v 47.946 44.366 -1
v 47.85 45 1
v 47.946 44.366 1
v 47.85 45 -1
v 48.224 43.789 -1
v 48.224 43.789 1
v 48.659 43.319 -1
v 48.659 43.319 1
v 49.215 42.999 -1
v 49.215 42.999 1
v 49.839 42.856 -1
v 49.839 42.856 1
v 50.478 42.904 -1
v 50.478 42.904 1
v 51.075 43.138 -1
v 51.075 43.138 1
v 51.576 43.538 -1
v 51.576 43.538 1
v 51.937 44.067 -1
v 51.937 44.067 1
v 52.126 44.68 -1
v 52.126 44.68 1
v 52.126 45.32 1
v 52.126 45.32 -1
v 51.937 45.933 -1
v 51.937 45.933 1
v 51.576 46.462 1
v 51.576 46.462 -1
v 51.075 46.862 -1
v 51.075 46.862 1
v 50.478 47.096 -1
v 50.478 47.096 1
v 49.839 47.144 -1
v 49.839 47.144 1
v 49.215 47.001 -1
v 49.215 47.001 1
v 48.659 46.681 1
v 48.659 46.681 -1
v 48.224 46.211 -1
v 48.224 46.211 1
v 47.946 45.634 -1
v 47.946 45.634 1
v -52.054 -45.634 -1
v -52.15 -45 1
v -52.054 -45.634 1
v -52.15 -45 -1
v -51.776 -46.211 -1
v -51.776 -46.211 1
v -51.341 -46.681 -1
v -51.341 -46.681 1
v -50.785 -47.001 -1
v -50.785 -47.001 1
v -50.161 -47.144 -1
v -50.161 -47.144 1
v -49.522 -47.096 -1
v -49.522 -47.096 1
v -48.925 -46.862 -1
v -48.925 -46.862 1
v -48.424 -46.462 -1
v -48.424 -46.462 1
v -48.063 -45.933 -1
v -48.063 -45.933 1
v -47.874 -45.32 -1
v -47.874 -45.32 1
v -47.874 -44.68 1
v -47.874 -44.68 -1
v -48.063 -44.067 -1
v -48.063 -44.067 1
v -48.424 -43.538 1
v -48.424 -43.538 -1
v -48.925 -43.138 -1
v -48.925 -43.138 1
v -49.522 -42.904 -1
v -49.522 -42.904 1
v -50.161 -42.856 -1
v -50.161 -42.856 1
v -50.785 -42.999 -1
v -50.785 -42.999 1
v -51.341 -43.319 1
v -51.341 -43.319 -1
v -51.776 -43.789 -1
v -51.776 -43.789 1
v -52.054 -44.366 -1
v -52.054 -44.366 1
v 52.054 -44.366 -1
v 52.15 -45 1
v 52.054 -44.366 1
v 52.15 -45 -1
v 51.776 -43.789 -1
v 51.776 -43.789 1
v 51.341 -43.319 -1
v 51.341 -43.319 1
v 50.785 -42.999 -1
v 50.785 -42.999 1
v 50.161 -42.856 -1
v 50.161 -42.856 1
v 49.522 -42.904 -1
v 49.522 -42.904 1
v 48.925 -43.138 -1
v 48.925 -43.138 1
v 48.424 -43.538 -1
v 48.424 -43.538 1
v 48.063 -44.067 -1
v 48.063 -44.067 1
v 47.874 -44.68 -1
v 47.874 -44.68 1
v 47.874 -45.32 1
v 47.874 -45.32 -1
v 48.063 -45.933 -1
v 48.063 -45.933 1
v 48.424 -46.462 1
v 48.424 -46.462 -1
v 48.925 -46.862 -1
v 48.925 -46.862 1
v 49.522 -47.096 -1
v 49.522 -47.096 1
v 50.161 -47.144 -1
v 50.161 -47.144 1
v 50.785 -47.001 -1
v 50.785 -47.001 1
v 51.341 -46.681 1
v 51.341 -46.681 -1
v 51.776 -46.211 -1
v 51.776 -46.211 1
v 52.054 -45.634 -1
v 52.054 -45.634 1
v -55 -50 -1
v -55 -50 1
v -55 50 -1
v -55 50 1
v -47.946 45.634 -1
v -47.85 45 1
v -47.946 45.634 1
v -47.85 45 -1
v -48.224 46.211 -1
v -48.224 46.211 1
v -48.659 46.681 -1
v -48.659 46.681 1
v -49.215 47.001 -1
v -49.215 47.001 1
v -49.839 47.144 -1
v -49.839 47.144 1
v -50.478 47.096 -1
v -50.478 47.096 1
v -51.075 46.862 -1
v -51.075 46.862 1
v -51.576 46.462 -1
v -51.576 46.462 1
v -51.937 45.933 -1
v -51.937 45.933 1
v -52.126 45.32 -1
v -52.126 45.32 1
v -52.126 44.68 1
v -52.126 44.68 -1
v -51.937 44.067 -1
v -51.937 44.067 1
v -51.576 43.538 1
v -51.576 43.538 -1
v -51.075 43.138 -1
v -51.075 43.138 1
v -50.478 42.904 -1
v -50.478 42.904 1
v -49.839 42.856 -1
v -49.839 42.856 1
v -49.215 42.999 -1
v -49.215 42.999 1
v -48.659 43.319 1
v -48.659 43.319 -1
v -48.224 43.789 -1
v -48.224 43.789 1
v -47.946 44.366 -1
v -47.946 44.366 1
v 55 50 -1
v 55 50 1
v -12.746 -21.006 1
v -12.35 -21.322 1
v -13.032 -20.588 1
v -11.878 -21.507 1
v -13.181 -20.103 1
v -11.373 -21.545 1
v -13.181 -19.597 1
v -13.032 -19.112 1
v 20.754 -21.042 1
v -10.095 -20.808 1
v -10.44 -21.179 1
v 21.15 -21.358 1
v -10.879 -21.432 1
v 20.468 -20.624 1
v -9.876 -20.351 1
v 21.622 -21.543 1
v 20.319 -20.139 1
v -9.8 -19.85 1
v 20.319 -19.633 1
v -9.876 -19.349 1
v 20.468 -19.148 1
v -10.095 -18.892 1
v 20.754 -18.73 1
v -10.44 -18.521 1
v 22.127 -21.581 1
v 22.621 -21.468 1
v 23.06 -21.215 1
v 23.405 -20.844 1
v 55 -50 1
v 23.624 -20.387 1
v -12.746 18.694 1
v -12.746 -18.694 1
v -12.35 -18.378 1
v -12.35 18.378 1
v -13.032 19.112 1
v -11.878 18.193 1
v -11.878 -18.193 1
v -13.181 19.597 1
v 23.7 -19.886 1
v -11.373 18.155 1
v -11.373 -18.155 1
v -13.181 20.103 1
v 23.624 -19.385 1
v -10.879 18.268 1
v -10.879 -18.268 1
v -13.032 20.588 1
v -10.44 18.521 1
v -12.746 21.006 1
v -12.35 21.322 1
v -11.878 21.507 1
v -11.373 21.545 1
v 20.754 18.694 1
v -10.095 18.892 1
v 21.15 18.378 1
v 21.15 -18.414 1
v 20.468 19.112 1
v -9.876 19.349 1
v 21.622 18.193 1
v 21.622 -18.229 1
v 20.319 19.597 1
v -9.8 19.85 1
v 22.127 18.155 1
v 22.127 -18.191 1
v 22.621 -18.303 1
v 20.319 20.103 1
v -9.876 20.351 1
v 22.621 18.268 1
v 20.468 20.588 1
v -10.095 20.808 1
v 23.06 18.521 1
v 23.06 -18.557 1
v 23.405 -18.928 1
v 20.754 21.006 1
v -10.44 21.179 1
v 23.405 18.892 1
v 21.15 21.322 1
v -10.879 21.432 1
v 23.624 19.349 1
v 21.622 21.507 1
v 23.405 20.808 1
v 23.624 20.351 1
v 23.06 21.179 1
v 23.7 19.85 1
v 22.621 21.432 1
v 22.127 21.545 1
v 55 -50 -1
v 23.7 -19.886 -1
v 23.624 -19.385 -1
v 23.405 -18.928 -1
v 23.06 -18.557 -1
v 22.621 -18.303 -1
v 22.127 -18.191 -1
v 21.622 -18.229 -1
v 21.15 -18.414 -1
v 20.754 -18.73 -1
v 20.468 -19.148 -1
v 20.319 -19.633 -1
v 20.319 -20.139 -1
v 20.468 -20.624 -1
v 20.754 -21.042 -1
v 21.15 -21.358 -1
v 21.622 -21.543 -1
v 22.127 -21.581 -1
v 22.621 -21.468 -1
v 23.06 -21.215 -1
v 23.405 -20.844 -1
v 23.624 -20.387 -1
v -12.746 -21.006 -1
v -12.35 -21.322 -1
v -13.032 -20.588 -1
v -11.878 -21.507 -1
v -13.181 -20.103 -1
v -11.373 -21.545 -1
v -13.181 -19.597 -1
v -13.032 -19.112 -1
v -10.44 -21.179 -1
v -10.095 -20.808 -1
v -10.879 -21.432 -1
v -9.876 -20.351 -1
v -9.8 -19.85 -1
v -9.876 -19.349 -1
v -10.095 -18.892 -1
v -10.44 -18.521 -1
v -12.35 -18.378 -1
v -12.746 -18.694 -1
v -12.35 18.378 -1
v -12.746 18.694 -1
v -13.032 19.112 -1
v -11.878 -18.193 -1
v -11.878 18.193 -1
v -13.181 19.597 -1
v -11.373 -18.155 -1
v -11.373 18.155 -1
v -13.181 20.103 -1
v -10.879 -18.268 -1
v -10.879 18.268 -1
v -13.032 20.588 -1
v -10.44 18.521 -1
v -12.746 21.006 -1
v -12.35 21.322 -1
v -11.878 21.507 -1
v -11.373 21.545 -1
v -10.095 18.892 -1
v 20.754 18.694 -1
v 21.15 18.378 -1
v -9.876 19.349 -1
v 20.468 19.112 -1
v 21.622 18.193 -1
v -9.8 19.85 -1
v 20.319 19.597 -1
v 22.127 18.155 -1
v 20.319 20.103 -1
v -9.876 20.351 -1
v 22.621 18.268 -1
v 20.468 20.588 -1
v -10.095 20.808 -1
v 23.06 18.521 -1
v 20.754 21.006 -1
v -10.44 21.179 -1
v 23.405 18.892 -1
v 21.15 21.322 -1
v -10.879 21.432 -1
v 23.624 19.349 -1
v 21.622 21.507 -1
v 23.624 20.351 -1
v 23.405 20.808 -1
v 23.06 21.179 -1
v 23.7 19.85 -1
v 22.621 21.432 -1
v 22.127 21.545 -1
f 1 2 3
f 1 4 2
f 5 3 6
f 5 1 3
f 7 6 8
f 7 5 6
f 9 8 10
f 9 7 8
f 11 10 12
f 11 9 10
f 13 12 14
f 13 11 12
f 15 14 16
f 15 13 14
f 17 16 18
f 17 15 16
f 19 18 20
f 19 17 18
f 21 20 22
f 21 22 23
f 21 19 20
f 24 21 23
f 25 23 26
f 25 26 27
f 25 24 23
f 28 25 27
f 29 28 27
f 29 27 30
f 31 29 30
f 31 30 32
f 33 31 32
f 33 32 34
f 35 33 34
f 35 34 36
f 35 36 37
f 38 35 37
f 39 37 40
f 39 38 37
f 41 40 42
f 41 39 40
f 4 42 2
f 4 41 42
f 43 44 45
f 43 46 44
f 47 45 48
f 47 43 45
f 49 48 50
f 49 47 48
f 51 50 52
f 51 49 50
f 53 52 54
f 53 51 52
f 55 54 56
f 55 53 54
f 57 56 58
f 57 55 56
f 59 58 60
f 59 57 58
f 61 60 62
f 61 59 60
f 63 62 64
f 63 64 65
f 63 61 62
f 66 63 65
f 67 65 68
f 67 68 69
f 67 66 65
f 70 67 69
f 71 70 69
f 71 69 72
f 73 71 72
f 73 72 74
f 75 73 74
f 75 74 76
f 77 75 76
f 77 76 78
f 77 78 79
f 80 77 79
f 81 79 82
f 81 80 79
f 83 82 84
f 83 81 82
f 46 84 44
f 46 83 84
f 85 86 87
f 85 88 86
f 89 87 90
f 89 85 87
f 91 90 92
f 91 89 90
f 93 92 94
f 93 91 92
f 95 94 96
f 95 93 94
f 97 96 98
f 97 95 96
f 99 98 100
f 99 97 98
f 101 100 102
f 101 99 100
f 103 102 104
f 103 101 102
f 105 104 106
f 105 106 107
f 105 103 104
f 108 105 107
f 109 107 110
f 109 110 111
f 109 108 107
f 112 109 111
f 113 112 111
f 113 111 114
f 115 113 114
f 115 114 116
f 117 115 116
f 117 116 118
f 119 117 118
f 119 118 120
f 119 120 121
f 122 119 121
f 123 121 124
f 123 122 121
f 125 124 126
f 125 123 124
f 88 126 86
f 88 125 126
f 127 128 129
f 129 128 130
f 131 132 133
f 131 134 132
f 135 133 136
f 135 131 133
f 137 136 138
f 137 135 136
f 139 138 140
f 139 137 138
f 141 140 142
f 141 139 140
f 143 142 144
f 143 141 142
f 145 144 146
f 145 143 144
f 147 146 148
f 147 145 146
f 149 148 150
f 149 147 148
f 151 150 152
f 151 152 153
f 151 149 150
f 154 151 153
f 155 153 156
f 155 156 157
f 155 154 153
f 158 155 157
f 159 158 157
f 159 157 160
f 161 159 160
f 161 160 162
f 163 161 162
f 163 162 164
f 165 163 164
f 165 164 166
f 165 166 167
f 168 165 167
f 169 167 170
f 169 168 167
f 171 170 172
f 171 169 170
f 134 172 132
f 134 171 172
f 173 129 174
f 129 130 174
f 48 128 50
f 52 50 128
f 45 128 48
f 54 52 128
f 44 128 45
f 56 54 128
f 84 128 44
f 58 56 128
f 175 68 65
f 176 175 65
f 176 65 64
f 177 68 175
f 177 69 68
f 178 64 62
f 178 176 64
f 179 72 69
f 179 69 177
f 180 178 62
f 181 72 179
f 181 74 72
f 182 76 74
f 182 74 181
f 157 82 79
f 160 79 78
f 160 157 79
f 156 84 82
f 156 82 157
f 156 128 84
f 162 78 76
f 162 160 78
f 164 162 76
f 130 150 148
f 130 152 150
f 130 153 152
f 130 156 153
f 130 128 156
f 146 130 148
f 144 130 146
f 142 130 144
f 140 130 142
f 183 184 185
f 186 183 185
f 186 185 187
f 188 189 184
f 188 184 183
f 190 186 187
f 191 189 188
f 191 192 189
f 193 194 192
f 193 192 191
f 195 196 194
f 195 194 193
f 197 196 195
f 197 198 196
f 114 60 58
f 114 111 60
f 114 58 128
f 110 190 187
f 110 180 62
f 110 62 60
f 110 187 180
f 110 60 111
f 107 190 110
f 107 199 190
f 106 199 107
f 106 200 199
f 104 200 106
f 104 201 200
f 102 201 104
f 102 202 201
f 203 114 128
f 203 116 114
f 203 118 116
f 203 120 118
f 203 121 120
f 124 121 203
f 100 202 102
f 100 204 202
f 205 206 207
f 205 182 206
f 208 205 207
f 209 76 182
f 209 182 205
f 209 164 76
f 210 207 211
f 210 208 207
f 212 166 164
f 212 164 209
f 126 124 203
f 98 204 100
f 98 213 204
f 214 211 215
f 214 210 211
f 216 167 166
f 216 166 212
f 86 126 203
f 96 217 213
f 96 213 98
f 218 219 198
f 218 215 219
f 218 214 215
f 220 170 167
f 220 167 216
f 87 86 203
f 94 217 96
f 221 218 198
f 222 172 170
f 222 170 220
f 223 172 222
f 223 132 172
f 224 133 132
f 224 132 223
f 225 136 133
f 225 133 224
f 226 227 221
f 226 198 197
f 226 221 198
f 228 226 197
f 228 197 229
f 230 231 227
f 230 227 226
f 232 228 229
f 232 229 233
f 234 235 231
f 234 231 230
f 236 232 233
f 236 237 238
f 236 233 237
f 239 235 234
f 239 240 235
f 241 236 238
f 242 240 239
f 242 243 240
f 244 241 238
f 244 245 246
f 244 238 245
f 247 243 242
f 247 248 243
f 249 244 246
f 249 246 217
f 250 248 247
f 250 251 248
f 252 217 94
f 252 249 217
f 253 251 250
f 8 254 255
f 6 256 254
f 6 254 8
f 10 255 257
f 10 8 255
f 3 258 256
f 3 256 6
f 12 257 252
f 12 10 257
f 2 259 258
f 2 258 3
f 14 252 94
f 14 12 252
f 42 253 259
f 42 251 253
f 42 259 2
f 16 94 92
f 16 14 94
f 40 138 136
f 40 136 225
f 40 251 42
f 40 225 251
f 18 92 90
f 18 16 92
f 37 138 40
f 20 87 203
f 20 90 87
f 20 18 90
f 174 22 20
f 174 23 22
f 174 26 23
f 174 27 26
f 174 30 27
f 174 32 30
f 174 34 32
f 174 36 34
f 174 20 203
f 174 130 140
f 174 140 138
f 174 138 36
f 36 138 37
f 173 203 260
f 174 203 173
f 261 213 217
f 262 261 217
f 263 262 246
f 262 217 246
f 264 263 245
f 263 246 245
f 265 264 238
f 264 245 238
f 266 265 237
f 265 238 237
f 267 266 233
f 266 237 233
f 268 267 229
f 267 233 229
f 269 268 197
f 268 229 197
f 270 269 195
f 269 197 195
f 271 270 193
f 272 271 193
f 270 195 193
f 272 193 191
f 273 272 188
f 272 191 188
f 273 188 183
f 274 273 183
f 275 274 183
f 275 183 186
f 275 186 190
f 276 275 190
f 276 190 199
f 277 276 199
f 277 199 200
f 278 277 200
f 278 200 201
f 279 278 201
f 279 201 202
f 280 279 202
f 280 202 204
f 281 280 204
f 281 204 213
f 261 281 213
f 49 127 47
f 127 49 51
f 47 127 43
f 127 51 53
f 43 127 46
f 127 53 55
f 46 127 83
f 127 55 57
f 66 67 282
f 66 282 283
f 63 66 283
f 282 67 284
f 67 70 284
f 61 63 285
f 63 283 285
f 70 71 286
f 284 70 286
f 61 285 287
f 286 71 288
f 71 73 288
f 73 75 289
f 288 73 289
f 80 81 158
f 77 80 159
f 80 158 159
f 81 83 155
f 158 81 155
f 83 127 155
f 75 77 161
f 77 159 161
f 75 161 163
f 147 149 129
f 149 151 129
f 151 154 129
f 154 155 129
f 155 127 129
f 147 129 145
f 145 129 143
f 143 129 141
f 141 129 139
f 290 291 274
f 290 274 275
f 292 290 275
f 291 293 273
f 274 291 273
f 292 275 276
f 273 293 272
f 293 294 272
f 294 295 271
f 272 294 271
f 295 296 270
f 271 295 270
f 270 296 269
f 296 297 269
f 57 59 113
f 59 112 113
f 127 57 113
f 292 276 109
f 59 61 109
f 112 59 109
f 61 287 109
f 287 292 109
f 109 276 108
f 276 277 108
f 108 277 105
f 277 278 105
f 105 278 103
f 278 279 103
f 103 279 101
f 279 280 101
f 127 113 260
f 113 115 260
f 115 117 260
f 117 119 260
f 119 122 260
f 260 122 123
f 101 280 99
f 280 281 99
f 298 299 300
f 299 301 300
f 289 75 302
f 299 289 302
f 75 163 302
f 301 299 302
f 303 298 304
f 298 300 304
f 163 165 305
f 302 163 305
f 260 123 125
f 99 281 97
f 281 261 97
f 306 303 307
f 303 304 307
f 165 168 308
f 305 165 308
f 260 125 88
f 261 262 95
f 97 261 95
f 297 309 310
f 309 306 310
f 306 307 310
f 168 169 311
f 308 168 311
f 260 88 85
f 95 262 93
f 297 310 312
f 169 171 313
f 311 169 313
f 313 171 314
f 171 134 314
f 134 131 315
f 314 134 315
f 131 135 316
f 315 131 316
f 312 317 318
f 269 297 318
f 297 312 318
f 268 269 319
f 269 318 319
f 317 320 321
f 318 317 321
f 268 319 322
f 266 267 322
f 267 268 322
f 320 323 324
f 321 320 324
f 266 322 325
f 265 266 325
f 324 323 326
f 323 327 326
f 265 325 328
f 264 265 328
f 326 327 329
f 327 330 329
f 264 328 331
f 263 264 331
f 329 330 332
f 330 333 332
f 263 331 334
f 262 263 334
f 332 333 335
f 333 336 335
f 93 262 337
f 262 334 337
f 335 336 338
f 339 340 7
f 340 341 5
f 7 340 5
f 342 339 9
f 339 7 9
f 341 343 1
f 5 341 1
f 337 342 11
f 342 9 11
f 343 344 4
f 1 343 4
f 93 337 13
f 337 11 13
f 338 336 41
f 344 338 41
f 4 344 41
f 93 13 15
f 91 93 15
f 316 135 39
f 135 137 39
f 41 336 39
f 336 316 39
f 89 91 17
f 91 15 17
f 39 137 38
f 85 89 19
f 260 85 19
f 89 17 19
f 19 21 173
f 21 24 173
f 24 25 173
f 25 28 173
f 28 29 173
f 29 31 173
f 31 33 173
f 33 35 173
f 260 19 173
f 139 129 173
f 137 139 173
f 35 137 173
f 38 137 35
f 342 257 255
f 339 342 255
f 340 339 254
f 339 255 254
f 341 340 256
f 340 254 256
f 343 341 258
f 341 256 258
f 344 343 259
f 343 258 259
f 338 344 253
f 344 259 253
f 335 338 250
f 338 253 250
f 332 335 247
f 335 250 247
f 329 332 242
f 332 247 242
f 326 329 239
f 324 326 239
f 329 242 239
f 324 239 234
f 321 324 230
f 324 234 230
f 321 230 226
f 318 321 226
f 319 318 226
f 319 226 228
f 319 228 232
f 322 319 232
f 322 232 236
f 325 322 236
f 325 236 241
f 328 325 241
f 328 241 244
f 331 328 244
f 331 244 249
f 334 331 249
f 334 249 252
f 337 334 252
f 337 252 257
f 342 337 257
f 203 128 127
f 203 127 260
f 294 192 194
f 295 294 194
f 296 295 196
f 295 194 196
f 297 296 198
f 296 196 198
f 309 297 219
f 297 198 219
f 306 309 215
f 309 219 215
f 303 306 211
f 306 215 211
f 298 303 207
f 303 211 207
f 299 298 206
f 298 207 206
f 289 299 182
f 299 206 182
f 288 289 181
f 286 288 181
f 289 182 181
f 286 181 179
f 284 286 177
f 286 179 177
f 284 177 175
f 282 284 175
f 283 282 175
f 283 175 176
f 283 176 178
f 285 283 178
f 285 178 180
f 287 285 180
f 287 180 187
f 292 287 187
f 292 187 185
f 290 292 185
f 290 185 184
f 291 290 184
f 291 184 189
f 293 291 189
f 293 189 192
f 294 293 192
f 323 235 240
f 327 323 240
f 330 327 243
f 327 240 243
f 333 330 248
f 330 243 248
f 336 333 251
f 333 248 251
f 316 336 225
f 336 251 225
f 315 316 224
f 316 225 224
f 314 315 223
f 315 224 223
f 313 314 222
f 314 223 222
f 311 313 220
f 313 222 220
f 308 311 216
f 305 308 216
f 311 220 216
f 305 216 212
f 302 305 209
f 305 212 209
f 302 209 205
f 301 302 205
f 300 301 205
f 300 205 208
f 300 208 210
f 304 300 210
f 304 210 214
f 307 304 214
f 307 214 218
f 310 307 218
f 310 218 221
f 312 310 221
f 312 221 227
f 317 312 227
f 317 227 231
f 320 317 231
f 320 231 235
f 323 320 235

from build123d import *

# Parameters (mm, degrees)
SKETCH_1_W          = 110
SKETCH_1_H          = 100
SKETCH_1_R          = 2.15
EXTRUDE_1_DEPTH     = 1
SKETCH_2_R          = 1.7
CUT_EXTRUDE_1_DEPTH = 15


with BuildPart() as part:
    # Эскиз1 → Бобышка-Вытянуть1 (new, symmetric)
    with BuildSketch(Plane.XY):
        Rectangle(SKETCH_1_W, SKETCH_1_H)
        with Locations((-50, 45)):
            Circle(SKETCH_1_R, mode=Mode.SUBTRACT)
        with Locations(Location((50, 45, 0), (0, 0, 180))):
            Circle(SKETCH_1_R, mode=Mode.SUBTRACT)
        with Locations((50, -45)):
            Circle(SKETCH_1_R, mode=Mode.SUBTRACT)
        with Locations(Location((-50, -45, 0), (0, 0, 180))):
            Circle(SKETCH_1_R, mode=Mode.SUBTRACT)
    extrude(amount=EXTRUDE_1_DEPTH, both=True)

    # Эскиз2 → Вырез-Вытянуть1 (cut)
    with BuildSketch(Plane.XY.offset(1)):
        with Locations((22, 19.85)):
            Circle(SKETCH_2_R)
        with Locations((-11.5, 19.85)):
            Circle(SKETCH_2_R)
        with Locations((22, -19.885932887)):
            Circle(SKETCH_2_R)
        with Locations((-11.5, -19.85)):
            Circle(SKETCH_2_R)
    extrude(amount=-CUT_EXTRUDE_1_DEPTH, mode=Mode.SUBTRACT)


solid = part.part
